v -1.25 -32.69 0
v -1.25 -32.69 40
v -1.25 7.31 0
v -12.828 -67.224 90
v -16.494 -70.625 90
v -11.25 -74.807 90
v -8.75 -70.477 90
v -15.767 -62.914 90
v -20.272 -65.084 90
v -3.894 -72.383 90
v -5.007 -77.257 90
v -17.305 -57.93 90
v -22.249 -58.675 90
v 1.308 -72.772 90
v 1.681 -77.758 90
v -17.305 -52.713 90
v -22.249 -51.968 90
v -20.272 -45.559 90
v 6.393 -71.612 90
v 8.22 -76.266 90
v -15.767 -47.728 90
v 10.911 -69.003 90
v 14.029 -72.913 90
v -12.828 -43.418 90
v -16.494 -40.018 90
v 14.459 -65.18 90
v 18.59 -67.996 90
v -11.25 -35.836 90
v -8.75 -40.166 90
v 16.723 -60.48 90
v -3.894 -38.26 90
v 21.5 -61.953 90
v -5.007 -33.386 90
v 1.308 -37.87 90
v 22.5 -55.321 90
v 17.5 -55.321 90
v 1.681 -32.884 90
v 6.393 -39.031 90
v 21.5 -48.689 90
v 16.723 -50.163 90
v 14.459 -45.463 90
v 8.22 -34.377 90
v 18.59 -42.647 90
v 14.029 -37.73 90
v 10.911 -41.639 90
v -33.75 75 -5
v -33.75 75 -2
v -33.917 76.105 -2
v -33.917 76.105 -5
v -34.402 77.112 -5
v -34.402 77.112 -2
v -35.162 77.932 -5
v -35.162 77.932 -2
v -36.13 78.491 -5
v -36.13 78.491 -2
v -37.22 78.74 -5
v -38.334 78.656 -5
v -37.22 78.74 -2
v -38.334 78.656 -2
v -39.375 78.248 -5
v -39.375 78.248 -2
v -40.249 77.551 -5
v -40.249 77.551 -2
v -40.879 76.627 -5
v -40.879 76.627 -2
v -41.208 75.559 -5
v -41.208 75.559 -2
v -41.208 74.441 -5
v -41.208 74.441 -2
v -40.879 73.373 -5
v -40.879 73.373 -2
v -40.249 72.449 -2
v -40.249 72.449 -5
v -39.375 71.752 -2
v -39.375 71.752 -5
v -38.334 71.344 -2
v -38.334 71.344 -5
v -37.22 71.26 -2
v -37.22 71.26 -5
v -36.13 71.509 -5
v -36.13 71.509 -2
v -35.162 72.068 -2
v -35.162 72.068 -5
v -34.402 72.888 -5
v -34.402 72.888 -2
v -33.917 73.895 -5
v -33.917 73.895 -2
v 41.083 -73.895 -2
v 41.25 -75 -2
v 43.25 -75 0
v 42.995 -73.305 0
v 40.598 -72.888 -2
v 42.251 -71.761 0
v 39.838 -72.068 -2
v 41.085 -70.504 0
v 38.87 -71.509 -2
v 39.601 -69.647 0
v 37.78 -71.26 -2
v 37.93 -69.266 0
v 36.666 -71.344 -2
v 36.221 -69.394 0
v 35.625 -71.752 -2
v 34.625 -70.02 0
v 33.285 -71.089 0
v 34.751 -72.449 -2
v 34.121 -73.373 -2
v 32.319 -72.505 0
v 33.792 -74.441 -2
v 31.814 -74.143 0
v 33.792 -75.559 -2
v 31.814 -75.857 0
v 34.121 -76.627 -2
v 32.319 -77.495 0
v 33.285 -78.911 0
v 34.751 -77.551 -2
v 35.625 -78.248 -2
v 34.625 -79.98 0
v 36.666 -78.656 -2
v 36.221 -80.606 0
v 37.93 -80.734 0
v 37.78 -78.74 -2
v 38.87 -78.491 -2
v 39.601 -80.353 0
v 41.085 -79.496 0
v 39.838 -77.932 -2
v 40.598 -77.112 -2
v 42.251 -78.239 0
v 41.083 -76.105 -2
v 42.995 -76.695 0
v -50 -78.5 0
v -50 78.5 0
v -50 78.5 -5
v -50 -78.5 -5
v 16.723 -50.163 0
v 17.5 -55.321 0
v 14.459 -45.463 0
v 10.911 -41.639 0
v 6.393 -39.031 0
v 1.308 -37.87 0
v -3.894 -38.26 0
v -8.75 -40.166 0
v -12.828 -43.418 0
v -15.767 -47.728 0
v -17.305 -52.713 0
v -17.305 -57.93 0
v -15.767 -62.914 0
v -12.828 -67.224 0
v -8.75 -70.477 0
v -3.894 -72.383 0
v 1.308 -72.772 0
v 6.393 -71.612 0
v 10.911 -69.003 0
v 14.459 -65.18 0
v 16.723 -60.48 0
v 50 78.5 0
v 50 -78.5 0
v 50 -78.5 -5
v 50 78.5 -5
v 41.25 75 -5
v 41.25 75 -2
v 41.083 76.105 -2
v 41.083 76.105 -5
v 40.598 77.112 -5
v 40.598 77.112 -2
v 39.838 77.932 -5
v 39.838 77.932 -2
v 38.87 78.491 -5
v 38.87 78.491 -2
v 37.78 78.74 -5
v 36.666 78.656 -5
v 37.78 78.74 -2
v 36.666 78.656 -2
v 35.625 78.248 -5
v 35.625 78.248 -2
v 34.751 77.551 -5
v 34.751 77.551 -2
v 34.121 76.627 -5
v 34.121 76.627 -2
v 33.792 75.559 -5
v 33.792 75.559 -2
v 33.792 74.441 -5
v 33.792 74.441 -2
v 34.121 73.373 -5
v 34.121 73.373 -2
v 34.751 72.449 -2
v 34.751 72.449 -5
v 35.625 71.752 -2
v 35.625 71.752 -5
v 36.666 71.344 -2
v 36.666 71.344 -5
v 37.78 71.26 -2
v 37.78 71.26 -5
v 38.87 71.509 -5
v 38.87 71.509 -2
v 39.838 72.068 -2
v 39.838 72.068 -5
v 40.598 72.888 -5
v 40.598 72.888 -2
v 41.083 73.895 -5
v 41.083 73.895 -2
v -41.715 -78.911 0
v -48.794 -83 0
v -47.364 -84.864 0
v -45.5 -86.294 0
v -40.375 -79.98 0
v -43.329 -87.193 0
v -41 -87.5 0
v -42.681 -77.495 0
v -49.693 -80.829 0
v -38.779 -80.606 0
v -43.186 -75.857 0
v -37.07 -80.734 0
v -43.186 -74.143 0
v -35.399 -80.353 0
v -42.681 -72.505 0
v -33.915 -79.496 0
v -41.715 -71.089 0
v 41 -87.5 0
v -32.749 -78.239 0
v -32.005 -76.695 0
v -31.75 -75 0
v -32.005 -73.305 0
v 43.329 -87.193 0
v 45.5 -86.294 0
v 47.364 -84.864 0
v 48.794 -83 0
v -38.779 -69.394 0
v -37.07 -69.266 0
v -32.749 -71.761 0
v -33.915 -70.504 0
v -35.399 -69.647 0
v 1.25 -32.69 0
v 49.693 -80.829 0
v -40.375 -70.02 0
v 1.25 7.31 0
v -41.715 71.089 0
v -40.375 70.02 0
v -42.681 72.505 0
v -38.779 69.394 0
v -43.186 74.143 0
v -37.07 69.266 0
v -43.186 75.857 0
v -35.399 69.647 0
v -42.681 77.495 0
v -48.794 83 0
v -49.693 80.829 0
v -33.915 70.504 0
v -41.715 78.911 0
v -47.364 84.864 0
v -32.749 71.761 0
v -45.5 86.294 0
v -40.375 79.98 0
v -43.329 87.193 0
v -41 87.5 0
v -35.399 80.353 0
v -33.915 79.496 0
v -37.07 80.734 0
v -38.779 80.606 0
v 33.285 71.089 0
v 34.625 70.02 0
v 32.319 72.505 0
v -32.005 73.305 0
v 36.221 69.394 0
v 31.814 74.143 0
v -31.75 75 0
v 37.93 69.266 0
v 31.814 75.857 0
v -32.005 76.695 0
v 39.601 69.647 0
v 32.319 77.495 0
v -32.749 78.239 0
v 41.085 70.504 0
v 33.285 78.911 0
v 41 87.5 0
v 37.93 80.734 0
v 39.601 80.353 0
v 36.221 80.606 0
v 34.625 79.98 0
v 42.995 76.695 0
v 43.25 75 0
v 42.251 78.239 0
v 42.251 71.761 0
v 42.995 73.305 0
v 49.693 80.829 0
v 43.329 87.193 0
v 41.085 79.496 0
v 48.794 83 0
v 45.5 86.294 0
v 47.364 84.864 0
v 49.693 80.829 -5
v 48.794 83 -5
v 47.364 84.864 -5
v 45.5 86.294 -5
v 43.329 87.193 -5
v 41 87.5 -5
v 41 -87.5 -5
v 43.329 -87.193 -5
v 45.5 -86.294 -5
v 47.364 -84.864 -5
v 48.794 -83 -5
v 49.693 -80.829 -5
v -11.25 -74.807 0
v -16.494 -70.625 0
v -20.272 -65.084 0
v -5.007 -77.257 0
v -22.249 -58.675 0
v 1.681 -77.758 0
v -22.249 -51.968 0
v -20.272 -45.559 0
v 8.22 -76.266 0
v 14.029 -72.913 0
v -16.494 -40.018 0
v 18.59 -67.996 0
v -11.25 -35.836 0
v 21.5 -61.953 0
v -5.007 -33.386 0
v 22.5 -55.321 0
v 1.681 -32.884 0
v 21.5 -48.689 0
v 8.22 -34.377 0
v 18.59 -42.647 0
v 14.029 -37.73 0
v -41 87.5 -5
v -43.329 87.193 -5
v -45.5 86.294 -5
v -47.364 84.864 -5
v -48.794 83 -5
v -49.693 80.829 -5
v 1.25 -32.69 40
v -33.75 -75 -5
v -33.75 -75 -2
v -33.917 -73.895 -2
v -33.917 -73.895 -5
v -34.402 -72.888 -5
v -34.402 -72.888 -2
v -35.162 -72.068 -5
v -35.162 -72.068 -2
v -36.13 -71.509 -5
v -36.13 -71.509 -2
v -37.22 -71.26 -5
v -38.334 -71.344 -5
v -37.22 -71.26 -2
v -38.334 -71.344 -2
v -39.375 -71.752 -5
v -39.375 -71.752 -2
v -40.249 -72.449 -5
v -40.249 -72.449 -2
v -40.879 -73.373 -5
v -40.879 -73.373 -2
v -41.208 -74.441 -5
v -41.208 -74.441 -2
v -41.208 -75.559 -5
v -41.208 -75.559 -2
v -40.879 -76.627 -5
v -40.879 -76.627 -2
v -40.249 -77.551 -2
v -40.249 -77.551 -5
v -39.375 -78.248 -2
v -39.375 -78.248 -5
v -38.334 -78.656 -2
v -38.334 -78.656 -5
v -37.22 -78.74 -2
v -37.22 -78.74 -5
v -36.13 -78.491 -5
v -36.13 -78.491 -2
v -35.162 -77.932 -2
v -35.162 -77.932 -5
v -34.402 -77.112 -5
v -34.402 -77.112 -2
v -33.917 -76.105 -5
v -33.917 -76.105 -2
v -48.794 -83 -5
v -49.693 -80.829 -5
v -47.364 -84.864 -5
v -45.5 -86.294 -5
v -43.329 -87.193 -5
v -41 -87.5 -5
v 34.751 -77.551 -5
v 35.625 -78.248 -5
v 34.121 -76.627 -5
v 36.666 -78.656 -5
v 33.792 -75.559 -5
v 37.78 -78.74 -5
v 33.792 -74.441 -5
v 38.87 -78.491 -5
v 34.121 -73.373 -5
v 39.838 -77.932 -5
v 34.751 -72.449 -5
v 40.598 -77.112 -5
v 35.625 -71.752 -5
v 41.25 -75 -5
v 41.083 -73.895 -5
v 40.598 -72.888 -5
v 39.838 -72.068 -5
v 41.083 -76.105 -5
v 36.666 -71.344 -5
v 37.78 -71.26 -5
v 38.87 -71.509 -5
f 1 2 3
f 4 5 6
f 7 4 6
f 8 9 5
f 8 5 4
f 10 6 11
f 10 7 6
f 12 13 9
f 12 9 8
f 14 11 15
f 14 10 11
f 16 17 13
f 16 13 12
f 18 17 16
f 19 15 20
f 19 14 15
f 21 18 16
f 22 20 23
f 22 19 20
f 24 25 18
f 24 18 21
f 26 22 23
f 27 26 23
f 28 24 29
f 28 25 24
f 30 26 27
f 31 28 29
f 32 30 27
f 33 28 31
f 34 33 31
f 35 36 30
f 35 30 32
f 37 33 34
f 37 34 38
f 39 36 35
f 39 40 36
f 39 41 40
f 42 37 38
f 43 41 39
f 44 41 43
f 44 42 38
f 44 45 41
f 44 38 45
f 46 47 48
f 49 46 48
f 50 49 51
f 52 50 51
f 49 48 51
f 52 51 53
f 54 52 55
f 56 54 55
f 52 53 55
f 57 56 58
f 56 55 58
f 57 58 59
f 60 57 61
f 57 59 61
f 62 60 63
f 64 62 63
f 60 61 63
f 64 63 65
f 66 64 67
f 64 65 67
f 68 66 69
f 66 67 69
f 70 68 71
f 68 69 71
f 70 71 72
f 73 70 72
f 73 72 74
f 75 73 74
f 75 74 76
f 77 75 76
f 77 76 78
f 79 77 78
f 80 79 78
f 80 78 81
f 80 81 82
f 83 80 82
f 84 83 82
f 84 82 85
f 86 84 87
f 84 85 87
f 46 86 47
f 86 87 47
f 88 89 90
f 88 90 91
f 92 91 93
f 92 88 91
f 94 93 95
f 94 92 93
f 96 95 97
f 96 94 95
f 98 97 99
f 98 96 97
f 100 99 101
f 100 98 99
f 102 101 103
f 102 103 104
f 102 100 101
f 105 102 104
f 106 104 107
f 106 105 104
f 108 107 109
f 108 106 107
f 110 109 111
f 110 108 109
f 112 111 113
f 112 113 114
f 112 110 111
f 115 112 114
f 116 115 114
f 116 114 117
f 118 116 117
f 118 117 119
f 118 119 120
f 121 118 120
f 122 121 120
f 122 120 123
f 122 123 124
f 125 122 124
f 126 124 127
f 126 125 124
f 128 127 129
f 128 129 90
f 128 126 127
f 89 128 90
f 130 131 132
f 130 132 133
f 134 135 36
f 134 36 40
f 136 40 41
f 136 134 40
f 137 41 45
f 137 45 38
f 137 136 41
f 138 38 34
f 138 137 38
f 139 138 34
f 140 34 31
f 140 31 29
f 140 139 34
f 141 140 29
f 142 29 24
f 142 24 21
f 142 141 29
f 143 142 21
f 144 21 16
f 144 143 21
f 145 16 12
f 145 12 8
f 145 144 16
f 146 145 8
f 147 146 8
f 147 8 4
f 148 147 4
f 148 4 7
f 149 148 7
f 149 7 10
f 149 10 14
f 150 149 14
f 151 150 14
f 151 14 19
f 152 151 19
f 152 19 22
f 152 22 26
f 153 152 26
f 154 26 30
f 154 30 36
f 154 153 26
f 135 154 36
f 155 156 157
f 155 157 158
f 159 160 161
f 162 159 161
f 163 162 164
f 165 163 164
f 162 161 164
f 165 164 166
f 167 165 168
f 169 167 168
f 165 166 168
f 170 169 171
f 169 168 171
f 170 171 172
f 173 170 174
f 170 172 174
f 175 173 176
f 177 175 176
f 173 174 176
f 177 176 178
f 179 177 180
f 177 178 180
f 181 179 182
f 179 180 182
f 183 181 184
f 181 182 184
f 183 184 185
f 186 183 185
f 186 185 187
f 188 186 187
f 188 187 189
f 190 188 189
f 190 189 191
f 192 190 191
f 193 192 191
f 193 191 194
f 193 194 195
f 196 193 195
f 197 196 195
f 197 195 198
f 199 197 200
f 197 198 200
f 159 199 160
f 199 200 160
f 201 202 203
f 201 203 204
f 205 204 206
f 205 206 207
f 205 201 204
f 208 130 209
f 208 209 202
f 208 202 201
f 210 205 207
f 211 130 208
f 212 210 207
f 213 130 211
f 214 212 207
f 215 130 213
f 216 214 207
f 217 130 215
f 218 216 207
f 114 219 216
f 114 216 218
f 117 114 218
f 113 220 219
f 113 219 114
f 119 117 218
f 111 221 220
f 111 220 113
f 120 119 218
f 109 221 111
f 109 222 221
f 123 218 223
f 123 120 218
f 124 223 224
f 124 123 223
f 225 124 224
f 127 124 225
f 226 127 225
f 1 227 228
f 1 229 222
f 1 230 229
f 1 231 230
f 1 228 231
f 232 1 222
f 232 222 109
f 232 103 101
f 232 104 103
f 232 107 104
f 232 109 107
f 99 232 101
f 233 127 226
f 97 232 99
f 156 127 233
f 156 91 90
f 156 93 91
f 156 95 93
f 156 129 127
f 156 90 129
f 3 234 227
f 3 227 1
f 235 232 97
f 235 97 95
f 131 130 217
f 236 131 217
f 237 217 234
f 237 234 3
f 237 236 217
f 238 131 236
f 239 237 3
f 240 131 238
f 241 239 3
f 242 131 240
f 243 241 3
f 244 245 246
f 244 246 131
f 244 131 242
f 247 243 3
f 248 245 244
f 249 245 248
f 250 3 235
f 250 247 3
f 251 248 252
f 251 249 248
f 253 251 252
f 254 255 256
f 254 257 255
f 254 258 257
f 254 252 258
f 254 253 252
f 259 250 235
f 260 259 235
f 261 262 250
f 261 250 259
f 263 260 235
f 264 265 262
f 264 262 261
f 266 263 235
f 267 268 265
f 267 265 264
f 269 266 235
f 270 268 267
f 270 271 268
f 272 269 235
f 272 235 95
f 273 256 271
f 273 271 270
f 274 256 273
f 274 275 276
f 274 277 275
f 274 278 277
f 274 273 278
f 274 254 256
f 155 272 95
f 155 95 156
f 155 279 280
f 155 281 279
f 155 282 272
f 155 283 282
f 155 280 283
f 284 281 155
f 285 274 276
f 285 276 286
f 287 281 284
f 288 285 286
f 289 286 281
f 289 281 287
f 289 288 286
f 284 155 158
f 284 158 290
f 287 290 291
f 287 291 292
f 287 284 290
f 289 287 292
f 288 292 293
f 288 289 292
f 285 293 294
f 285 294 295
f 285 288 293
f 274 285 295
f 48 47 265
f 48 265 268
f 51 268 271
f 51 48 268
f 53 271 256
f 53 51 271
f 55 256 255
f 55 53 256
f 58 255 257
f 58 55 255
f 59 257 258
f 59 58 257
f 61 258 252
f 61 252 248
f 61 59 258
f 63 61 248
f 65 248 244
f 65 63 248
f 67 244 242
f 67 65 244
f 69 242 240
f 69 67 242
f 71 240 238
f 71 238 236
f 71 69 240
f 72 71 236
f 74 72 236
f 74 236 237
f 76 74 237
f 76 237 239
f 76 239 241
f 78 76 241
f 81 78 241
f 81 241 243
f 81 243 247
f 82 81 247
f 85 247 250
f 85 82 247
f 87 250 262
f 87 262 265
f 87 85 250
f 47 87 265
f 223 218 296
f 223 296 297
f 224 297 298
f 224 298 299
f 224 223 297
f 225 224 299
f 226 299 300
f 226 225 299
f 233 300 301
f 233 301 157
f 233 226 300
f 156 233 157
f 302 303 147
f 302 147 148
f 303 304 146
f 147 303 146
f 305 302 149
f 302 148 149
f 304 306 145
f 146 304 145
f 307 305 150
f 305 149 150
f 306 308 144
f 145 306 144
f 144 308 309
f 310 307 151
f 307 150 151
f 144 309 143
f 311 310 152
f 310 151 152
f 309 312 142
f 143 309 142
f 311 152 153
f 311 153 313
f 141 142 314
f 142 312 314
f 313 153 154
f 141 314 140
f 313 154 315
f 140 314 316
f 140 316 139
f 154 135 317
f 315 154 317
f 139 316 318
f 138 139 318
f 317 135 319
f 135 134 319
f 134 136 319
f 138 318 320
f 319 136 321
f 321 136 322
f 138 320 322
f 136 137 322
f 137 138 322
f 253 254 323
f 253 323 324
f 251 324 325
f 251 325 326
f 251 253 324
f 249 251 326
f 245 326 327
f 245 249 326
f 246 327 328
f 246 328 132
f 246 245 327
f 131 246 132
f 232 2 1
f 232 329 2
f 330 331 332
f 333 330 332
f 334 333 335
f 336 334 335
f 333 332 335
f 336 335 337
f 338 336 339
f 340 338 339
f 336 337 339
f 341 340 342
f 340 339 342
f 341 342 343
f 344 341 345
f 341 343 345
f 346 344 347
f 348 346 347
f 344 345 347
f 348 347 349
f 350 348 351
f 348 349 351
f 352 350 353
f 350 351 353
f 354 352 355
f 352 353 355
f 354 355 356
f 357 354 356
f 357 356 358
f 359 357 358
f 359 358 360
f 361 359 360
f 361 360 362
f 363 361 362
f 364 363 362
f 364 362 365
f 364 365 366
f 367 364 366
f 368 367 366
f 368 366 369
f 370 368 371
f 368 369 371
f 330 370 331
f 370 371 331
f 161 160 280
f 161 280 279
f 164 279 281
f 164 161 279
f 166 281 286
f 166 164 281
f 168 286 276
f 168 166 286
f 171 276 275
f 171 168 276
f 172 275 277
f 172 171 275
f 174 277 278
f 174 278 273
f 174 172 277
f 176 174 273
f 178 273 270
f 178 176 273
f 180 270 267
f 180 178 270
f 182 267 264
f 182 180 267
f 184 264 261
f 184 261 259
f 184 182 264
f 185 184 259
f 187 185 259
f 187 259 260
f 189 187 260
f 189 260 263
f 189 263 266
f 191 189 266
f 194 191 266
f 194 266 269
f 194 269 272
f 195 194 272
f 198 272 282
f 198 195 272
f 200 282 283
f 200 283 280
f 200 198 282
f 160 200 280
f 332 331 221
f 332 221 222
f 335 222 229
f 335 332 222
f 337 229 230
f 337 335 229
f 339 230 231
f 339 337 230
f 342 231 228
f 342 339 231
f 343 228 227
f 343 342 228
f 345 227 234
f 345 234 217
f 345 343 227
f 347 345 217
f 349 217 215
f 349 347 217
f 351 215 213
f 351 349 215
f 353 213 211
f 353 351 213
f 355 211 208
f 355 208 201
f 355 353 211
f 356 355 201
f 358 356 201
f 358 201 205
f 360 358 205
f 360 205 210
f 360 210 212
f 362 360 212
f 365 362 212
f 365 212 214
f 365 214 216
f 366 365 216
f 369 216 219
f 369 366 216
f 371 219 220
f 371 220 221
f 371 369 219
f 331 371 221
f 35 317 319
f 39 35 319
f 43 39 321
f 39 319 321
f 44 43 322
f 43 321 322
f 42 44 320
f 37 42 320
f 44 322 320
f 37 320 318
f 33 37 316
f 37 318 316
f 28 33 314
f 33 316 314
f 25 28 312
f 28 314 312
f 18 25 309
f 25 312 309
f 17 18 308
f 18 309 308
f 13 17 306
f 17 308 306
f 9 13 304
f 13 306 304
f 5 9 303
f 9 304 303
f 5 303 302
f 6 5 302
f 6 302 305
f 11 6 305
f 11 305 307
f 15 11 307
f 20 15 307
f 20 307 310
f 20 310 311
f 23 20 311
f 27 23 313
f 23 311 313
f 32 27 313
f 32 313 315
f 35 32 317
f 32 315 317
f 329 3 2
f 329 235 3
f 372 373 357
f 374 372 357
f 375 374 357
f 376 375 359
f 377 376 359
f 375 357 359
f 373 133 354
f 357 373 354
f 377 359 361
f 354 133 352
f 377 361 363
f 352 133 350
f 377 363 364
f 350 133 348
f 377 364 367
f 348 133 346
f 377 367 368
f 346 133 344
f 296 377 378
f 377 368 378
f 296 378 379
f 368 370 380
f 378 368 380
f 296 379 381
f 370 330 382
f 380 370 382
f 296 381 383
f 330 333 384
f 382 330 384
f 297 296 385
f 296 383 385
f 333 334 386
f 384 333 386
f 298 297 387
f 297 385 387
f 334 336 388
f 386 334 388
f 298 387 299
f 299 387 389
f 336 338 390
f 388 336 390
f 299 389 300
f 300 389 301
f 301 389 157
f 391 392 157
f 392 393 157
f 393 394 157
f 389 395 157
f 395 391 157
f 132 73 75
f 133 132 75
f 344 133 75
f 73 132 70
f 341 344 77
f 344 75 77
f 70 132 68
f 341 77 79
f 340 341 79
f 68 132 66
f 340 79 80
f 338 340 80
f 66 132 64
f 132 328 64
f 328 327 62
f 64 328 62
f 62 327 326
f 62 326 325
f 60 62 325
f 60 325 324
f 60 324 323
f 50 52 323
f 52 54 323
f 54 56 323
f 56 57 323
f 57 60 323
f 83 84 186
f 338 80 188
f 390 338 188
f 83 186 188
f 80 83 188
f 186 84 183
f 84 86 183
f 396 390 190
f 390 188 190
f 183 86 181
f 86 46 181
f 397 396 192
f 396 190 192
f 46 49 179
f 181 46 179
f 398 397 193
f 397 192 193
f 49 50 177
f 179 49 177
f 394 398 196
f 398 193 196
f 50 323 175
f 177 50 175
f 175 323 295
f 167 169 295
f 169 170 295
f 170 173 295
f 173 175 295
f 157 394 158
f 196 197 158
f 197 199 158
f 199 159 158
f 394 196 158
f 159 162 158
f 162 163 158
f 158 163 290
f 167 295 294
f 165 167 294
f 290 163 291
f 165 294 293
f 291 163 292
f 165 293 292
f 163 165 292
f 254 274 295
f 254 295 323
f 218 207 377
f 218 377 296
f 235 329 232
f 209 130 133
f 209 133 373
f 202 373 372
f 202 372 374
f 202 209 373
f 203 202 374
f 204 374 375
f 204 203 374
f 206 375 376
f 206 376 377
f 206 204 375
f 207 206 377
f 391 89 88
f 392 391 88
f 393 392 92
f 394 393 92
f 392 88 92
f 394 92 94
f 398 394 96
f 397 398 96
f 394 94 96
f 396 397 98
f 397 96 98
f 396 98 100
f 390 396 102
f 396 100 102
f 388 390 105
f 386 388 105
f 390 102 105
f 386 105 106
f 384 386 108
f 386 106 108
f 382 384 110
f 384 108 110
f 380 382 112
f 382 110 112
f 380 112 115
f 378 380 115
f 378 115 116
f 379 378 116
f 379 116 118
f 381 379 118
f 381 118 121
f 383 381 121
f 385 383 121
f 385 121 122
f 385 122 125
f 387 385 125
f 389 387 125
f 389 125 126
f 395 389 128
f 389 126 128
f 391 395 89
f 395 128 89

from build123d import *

# Parameters (mm, degrees)
F0_R     = 22.5
F0_R_2   = 17.5
F1_DEPTH = 90
F0_R_3   = 3.75
F2_DEPTH = 5
F4_DEPTH = 1.25
F5_SIZE  = 2


with BuildPart() as f1:
    # F0 (on Top) → F1 (new body)
    with BuildSketch(Plane.XY):
        with Locations((0, -55.321414)):
            Circle(F0_R)
        with Locations((0, -55.321414)):
            Circle(F0_R_2, mode=Mode.SUBTRACT)
    extrude(amount=F1_DEPTH)


with BuildPart() as f2:
    # F0 (on Top) → F2 (new body)
    with BuildSketch(Plane.XY):
        with BuildLine():
            ThreePointArc((-50, -78.5), (-47.363961, -84.863961), (-41, -87.5))
            Line((-41, -87.5), (41, -87.5))
            ThreePointArc((41, -87.5), (47.363961, -84.863961), (50, -78.5))
            Line((50, -78.5), (50, 78.5))
            ThreePointArc((50, 78.5), (47.363961, 84.863961), (41, 87.5))
            Line((41, 87.5), (-41, 87.5))
            ThreePointArc((-41, 87.5), (-47.363961, 84.863961), (-50, 78.5))
            Line((-50, 78.5), (-50, -78.5))
        make_face()
        with Locations((-37.5, -75)):
            Circle(F0_R_3, mode=Mode.SUBTRACT)
        with Locations((0, -55.321414)):
            Circle(F0_R, mode=Mode.SUBTRACT)
        with Locations((37.5, -75)):
            Circle(F0_R_3, mode=Mode.SUBTRACT)
        with Locations((-37.5, 75)):
            Circle(F0_R_3, mode=Mode.SUBTRACT)
        with Locations((37.5, 75)):
            Circle(F0_R_3, mode=Mode.SUBTRACT)
        with Locations((0, -55.321414)):
            Circle(F0_R)
        with Locations((0, -55.321414)):
            Circle(F0_R_2, mode=Mode.SUBTRACT)
        with Locations((0, -55.321414)):
            Circle(F0_R_2)
    extrude(amount=-F2_DEPTH)

    # F3 (on Right) → F4 (join, symmetric)
    with BuildSketch(Plane.YZ):
        Polygon((-32.68955, 40), (-32.68955, 0), (7.31045, 0), align=None)
    extrude(amount=F4_DEPTH, both=True)

    # F5
    f5_edges = [f2.edges().sort_by_distance(p)[0] for p in [
        (33.75, 75, 0),
        (-41.25, 75, 0),
        (33.75, -75, 0),
        (-41.25, -75, 0),
    ]]
    chamfer(f5_edges, length=F5_SIZE)


solid = Compound([f1.part, f2.part])
